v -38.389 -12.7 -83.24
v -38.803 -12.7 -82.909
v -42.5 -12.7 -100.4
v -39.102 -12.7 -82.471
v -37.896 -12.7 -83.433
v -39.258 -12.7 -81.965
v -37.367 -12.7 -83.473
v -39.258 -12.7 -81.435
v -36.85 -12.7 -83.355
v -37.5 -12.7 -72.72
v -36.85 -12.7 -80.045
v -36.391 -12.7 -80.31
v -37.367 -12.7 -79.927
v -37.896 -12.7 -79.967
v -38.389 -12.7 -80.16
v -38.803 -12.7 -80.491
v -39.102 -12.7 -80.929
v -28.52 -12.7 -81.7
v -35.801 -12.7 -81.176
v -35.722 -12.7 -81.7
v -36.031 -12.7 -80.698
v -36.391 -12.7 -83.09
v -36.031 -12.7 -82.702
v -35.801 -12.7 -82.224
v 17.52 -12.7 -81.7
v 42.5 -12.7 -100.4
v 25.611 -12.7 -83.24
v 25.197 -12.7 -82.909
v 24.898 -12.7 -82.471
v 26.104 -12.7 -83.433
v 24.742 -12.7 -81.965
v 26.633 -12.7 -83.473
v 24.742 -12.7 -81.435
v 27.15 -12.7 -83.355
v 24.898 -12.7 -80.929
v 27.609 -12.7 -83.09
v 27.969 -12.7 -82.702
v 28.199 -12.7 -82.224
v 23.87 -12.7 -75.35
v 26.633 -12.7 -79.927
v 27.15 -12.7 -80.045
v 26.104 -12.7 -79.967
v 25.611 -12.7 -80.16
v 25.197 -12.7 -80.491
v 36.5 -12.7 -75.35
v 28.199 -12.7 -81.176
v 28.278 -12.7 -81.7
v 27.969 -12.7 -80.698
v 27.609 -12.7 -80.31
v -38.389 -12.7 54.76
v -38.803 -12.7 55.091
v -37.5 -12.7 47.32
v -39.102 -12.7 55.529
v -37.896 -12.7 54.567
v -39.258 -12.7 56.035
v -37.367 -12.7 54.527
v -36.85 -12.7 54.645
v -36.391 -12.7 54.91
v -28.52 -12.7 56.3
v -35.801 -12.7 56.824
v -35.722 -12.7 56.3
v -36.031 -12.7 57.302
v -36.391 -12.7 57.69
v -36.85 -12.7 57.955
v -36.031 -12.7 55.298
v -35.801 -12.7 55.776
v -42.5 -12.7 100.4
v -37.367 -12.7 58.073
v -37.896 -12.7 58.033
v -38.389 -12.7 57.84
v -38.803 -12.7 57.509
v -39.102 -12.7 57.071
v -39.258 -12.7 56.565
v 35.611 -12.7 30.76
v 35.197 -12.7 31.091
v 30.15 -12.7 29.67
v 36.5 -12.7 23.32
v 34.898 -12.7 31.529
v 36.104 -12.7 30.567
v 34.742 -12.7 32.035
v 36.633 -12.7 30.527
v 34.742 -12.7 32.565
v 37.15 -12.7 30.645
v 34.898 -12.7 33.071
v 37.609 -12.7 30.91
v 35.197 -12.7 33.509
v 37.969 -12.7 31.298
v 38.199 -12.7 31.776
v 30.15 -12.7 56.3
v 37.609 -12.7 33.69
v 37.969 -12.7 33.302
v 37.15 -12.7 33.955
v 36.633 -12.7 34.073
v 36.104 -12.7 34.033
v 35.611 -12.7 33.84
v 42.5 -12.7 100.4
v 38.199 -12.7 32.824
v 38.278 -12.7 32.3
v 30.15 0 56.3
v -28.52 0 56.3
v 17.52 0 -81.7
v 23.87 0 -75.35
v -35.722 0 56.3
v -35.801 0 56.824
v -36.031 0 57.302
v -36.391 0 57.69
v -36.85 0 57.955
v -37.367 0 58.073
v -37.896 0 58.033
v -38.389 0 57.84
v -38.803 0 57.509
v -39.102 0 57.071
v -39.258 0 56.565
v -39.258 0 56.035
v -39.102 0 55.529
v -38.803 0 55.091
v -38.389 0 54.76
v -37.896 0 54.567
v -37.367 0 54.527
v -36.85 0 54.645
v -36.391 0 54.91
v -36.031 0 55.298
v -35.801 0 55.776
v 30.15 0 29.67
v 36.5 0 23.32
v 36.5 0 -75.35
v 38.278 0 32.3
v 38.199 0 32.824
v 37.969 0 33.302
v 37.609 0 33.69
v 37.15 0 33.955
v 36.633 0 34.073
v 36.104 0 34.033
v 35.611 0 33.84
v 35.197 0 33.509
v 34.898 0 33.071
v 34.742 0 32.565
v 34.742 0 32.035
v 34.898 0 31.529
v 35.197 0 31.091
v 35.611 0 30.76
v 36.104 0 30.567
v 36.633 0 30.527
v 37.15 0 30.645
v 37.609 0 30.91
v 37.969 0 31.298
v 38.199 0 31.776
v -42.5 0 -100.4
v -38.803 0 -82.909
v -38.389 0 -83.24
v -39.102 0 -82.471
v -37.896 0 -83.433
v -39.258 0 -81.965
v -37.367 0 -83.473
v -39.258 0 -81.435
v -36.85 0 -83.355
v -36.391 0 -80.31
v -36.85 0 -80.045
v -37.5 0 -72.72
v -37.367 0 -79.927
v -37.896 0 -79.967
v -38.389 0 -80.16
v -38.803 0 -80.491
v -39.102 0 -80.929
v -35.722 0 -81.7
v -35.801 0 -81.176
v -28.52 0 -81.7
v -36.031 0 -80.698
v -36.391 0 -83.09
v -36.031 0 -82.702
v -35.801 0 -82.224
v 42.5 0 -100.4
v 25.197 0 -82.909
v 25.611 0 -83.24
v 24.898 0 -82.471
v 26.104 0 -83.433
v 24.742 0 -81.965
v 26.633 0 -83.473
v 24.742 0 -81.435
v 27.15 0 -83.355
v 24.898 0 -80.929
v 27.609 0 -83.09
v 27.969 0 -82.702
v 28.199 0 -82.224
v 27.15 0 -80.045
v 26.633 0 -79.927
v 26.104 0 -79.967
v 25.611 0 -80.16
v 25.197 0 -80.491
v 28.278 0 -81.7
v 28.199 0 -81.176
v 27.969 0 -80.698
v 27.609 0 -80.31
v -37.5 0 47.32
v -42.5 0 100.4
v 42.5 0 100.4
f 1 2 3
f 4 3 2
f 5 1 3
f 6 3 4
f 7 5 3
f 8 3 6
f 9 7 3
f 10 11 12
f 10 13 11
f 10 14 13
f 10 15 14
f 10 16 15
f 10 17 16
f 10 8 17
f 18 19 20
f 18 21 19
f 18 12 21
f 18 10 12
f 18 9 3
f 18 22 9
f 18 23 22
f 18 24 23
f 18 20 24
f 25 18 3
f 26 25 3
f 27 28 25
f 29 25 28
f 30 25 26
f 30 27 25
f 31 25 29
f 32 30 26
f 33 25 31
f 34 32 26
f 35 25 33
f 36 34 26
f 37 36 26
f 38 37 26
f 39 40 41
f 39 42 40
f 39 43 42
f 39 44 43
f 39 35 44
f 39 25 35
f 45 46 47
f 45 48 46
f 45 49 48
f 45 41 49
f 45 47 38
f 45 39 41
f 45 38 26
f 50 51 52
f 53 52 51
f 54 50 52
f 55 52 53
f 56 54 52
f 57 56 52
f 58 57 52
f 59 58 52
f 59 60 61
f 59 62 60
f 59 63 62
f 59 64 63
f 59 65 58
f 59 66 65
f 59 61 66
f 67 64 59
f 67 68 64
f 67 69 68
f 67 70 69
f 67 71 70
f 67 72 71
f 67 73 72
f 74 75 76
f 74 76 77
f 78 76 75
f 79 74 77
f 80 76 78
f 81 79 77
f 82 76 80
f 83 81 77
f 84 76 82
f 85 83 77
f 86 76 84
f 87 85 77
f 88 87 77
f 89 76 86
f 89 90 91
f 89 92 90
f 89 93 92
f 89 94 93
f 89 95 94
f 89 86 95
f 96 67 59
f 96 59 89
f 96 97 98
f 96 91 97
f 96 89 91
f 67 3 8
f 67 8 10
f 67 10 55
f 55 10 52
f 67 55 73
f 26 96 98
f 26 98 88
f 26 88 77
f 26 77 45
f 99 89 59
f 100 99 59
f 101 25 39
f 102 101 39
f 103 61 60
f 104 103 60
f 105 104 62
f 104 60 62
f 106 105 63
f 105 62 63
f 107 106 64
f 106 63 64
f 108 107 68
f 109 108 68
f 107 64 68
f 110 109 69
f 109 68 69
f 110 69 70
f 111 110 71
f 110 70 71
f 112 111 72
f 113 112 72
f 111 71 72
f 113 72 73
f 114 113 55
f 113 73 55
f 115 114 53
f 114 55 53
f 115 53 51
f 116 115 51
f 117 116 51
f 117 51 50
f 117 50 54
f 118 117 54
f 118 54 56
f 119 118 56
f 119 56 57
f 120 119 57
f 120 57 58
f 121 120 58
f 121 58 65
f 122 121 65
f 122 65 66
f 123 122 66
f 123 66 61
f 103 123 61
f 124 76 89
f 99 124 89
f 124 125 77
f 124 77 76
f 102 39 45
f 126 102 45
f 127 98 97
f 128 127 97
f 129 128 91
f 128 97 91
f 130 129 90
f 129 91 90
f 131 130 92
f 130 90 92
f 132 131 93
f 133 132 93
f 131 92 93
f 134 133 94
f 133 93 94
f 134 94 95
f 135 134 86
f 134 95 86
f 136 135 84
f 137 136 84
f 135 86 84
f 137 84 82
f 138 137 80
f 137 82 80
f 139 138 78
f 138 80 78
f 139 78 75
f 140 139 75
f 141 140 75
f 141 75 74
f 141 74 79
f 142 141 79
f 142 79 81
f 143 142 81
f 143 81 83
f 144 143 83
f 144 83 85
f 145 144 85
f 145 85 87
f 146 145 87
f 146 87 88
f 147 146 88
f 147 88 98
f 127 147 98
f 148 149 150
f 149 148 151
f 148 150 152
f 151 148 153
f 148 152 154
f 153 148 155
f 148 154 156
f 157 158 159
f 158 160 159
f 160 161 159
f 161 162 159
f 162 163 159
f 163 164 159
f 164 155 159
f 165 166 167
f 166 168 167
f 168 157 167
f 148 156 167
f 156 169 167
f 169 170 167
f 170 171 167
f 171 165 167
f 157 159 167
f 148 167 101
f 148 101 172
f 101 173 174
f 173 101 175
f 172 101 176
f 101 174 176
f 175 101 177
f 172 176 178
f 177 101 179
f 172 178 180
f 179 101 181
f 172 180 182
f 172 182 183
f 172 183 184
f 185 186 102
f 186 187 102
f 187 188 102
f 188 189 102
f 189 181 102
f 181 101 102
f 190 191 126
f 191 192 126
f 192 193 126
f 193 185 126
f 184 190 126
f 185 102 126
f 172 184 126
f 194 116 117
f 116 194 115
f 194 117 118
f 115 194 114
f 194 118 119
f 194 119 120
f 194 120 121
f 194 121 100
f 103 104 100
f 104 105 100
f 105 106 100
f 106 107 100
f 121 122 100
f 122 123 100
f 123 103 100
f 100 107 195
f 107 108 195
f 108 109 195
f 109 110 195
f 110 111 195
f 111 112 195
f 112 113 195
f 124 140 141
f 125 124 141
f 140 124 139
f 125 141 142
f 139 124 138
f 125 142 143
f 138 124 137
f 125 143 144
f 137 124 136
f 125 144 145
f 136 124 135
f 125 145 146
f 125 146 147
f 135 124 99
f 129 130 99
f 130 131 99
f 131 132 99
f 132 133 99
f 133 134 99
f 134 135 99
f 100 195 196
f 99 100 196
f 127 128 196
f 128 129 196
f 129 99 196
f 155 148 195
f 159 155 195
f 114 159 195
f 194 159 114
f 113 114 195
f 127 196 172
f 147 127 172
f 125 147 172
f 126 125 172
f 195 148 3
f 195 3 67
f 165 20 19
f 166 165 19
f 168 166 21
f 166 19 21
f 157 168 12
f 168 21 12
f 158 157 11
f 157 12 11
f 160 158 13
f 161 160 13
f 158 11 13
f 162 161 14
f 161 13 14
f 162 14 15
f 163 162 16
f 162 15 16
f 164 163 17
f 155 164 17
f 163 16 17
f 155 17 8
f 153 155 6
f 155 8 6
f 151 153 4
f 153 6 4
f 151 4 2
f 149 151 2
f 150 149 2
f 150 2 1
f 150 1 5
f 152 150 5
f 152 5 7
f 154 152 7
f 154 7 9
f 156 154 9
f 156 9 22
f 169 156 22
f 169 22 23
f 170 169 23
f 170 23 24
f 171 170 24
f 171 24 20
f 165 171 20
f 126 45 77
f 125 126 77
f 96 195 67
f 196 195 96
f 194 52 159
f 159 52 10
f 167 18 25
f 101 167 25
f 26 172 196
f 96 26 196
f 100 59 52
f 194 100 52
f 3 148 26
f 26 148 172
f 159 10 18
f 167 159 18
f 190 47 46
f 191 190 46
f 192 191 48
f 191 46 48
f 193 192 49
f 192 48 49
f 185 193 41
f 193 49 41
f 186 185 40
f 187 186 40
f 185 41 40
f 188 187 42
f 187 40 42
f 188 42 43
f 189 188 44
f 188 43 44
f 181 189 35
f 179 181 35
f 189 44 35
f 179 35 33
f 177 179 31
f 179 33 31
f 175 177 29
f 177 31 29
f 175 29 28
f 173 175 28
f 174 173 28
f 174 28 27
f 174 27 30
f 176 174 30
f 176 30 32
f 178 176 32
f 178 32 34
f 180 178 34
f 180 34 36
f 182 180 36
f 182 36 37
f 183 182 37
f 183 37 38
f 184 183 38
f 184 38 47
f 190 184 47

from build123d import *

# Parameters (mm, degrees)
F0_W     = 85
F0_H     = 200.8
F1_DEPTH = 12.7
F3_R     = 1.778
F4_DEPTH = 12.701
F5_R     = 1.778
F6_DEPTH = 12.701


with BuildPart() as f1:
    # F0 (on Front) → F1 (new body)
    with BuildSketch(Plane.XZ):
        Rectangle(F0_W, F0_H)
    extrude(amount=F1_DEPTH)

    # F3 (on face) → F4 (cut, through all)
    with BuildSketch(Plane.XZ.offset(12.7)):
        with Locations((-37.5, 56.3)):
            Circle(F3_R)
        with Locations((36.5, 32.3)):
            Circle(F3_R)
        with Locations((26.5, -81.7)):
            Circle(F3_R)
        with Locations((-37.5, -81.7)):
            Circle(F3_R)
    extrude(amount=-F4_DEPTH, mode=Mode.SUBTRACT)

    # F5 (on face) → F6 (cut, through all)
    with BuildSketch(Plane.XZ.offset(12.7)):
        Polygon((-28.519744, 56.3), (-37.5, 47.319744), (-37.5, -72.719744), (-28.519744, -81.7), (17.519744, -81.7), (23.869744, -75.35), (36.5, -75.35), (36.5, 23.319744), (30.15, 29.669744), (30.15, 56.3), align=None)
        with Locations((36.5, 32.3)):
            Circle(F5_R)
        with Locations((-37.5, -81.7)):
            Circle(F5_R)
        with Locations((26.5, -81.7)):
            Circle(F5_R)
    extrude(amount=-F6_DEPTH, mode=Mode.SUBTRACT)


solid = f1.part
